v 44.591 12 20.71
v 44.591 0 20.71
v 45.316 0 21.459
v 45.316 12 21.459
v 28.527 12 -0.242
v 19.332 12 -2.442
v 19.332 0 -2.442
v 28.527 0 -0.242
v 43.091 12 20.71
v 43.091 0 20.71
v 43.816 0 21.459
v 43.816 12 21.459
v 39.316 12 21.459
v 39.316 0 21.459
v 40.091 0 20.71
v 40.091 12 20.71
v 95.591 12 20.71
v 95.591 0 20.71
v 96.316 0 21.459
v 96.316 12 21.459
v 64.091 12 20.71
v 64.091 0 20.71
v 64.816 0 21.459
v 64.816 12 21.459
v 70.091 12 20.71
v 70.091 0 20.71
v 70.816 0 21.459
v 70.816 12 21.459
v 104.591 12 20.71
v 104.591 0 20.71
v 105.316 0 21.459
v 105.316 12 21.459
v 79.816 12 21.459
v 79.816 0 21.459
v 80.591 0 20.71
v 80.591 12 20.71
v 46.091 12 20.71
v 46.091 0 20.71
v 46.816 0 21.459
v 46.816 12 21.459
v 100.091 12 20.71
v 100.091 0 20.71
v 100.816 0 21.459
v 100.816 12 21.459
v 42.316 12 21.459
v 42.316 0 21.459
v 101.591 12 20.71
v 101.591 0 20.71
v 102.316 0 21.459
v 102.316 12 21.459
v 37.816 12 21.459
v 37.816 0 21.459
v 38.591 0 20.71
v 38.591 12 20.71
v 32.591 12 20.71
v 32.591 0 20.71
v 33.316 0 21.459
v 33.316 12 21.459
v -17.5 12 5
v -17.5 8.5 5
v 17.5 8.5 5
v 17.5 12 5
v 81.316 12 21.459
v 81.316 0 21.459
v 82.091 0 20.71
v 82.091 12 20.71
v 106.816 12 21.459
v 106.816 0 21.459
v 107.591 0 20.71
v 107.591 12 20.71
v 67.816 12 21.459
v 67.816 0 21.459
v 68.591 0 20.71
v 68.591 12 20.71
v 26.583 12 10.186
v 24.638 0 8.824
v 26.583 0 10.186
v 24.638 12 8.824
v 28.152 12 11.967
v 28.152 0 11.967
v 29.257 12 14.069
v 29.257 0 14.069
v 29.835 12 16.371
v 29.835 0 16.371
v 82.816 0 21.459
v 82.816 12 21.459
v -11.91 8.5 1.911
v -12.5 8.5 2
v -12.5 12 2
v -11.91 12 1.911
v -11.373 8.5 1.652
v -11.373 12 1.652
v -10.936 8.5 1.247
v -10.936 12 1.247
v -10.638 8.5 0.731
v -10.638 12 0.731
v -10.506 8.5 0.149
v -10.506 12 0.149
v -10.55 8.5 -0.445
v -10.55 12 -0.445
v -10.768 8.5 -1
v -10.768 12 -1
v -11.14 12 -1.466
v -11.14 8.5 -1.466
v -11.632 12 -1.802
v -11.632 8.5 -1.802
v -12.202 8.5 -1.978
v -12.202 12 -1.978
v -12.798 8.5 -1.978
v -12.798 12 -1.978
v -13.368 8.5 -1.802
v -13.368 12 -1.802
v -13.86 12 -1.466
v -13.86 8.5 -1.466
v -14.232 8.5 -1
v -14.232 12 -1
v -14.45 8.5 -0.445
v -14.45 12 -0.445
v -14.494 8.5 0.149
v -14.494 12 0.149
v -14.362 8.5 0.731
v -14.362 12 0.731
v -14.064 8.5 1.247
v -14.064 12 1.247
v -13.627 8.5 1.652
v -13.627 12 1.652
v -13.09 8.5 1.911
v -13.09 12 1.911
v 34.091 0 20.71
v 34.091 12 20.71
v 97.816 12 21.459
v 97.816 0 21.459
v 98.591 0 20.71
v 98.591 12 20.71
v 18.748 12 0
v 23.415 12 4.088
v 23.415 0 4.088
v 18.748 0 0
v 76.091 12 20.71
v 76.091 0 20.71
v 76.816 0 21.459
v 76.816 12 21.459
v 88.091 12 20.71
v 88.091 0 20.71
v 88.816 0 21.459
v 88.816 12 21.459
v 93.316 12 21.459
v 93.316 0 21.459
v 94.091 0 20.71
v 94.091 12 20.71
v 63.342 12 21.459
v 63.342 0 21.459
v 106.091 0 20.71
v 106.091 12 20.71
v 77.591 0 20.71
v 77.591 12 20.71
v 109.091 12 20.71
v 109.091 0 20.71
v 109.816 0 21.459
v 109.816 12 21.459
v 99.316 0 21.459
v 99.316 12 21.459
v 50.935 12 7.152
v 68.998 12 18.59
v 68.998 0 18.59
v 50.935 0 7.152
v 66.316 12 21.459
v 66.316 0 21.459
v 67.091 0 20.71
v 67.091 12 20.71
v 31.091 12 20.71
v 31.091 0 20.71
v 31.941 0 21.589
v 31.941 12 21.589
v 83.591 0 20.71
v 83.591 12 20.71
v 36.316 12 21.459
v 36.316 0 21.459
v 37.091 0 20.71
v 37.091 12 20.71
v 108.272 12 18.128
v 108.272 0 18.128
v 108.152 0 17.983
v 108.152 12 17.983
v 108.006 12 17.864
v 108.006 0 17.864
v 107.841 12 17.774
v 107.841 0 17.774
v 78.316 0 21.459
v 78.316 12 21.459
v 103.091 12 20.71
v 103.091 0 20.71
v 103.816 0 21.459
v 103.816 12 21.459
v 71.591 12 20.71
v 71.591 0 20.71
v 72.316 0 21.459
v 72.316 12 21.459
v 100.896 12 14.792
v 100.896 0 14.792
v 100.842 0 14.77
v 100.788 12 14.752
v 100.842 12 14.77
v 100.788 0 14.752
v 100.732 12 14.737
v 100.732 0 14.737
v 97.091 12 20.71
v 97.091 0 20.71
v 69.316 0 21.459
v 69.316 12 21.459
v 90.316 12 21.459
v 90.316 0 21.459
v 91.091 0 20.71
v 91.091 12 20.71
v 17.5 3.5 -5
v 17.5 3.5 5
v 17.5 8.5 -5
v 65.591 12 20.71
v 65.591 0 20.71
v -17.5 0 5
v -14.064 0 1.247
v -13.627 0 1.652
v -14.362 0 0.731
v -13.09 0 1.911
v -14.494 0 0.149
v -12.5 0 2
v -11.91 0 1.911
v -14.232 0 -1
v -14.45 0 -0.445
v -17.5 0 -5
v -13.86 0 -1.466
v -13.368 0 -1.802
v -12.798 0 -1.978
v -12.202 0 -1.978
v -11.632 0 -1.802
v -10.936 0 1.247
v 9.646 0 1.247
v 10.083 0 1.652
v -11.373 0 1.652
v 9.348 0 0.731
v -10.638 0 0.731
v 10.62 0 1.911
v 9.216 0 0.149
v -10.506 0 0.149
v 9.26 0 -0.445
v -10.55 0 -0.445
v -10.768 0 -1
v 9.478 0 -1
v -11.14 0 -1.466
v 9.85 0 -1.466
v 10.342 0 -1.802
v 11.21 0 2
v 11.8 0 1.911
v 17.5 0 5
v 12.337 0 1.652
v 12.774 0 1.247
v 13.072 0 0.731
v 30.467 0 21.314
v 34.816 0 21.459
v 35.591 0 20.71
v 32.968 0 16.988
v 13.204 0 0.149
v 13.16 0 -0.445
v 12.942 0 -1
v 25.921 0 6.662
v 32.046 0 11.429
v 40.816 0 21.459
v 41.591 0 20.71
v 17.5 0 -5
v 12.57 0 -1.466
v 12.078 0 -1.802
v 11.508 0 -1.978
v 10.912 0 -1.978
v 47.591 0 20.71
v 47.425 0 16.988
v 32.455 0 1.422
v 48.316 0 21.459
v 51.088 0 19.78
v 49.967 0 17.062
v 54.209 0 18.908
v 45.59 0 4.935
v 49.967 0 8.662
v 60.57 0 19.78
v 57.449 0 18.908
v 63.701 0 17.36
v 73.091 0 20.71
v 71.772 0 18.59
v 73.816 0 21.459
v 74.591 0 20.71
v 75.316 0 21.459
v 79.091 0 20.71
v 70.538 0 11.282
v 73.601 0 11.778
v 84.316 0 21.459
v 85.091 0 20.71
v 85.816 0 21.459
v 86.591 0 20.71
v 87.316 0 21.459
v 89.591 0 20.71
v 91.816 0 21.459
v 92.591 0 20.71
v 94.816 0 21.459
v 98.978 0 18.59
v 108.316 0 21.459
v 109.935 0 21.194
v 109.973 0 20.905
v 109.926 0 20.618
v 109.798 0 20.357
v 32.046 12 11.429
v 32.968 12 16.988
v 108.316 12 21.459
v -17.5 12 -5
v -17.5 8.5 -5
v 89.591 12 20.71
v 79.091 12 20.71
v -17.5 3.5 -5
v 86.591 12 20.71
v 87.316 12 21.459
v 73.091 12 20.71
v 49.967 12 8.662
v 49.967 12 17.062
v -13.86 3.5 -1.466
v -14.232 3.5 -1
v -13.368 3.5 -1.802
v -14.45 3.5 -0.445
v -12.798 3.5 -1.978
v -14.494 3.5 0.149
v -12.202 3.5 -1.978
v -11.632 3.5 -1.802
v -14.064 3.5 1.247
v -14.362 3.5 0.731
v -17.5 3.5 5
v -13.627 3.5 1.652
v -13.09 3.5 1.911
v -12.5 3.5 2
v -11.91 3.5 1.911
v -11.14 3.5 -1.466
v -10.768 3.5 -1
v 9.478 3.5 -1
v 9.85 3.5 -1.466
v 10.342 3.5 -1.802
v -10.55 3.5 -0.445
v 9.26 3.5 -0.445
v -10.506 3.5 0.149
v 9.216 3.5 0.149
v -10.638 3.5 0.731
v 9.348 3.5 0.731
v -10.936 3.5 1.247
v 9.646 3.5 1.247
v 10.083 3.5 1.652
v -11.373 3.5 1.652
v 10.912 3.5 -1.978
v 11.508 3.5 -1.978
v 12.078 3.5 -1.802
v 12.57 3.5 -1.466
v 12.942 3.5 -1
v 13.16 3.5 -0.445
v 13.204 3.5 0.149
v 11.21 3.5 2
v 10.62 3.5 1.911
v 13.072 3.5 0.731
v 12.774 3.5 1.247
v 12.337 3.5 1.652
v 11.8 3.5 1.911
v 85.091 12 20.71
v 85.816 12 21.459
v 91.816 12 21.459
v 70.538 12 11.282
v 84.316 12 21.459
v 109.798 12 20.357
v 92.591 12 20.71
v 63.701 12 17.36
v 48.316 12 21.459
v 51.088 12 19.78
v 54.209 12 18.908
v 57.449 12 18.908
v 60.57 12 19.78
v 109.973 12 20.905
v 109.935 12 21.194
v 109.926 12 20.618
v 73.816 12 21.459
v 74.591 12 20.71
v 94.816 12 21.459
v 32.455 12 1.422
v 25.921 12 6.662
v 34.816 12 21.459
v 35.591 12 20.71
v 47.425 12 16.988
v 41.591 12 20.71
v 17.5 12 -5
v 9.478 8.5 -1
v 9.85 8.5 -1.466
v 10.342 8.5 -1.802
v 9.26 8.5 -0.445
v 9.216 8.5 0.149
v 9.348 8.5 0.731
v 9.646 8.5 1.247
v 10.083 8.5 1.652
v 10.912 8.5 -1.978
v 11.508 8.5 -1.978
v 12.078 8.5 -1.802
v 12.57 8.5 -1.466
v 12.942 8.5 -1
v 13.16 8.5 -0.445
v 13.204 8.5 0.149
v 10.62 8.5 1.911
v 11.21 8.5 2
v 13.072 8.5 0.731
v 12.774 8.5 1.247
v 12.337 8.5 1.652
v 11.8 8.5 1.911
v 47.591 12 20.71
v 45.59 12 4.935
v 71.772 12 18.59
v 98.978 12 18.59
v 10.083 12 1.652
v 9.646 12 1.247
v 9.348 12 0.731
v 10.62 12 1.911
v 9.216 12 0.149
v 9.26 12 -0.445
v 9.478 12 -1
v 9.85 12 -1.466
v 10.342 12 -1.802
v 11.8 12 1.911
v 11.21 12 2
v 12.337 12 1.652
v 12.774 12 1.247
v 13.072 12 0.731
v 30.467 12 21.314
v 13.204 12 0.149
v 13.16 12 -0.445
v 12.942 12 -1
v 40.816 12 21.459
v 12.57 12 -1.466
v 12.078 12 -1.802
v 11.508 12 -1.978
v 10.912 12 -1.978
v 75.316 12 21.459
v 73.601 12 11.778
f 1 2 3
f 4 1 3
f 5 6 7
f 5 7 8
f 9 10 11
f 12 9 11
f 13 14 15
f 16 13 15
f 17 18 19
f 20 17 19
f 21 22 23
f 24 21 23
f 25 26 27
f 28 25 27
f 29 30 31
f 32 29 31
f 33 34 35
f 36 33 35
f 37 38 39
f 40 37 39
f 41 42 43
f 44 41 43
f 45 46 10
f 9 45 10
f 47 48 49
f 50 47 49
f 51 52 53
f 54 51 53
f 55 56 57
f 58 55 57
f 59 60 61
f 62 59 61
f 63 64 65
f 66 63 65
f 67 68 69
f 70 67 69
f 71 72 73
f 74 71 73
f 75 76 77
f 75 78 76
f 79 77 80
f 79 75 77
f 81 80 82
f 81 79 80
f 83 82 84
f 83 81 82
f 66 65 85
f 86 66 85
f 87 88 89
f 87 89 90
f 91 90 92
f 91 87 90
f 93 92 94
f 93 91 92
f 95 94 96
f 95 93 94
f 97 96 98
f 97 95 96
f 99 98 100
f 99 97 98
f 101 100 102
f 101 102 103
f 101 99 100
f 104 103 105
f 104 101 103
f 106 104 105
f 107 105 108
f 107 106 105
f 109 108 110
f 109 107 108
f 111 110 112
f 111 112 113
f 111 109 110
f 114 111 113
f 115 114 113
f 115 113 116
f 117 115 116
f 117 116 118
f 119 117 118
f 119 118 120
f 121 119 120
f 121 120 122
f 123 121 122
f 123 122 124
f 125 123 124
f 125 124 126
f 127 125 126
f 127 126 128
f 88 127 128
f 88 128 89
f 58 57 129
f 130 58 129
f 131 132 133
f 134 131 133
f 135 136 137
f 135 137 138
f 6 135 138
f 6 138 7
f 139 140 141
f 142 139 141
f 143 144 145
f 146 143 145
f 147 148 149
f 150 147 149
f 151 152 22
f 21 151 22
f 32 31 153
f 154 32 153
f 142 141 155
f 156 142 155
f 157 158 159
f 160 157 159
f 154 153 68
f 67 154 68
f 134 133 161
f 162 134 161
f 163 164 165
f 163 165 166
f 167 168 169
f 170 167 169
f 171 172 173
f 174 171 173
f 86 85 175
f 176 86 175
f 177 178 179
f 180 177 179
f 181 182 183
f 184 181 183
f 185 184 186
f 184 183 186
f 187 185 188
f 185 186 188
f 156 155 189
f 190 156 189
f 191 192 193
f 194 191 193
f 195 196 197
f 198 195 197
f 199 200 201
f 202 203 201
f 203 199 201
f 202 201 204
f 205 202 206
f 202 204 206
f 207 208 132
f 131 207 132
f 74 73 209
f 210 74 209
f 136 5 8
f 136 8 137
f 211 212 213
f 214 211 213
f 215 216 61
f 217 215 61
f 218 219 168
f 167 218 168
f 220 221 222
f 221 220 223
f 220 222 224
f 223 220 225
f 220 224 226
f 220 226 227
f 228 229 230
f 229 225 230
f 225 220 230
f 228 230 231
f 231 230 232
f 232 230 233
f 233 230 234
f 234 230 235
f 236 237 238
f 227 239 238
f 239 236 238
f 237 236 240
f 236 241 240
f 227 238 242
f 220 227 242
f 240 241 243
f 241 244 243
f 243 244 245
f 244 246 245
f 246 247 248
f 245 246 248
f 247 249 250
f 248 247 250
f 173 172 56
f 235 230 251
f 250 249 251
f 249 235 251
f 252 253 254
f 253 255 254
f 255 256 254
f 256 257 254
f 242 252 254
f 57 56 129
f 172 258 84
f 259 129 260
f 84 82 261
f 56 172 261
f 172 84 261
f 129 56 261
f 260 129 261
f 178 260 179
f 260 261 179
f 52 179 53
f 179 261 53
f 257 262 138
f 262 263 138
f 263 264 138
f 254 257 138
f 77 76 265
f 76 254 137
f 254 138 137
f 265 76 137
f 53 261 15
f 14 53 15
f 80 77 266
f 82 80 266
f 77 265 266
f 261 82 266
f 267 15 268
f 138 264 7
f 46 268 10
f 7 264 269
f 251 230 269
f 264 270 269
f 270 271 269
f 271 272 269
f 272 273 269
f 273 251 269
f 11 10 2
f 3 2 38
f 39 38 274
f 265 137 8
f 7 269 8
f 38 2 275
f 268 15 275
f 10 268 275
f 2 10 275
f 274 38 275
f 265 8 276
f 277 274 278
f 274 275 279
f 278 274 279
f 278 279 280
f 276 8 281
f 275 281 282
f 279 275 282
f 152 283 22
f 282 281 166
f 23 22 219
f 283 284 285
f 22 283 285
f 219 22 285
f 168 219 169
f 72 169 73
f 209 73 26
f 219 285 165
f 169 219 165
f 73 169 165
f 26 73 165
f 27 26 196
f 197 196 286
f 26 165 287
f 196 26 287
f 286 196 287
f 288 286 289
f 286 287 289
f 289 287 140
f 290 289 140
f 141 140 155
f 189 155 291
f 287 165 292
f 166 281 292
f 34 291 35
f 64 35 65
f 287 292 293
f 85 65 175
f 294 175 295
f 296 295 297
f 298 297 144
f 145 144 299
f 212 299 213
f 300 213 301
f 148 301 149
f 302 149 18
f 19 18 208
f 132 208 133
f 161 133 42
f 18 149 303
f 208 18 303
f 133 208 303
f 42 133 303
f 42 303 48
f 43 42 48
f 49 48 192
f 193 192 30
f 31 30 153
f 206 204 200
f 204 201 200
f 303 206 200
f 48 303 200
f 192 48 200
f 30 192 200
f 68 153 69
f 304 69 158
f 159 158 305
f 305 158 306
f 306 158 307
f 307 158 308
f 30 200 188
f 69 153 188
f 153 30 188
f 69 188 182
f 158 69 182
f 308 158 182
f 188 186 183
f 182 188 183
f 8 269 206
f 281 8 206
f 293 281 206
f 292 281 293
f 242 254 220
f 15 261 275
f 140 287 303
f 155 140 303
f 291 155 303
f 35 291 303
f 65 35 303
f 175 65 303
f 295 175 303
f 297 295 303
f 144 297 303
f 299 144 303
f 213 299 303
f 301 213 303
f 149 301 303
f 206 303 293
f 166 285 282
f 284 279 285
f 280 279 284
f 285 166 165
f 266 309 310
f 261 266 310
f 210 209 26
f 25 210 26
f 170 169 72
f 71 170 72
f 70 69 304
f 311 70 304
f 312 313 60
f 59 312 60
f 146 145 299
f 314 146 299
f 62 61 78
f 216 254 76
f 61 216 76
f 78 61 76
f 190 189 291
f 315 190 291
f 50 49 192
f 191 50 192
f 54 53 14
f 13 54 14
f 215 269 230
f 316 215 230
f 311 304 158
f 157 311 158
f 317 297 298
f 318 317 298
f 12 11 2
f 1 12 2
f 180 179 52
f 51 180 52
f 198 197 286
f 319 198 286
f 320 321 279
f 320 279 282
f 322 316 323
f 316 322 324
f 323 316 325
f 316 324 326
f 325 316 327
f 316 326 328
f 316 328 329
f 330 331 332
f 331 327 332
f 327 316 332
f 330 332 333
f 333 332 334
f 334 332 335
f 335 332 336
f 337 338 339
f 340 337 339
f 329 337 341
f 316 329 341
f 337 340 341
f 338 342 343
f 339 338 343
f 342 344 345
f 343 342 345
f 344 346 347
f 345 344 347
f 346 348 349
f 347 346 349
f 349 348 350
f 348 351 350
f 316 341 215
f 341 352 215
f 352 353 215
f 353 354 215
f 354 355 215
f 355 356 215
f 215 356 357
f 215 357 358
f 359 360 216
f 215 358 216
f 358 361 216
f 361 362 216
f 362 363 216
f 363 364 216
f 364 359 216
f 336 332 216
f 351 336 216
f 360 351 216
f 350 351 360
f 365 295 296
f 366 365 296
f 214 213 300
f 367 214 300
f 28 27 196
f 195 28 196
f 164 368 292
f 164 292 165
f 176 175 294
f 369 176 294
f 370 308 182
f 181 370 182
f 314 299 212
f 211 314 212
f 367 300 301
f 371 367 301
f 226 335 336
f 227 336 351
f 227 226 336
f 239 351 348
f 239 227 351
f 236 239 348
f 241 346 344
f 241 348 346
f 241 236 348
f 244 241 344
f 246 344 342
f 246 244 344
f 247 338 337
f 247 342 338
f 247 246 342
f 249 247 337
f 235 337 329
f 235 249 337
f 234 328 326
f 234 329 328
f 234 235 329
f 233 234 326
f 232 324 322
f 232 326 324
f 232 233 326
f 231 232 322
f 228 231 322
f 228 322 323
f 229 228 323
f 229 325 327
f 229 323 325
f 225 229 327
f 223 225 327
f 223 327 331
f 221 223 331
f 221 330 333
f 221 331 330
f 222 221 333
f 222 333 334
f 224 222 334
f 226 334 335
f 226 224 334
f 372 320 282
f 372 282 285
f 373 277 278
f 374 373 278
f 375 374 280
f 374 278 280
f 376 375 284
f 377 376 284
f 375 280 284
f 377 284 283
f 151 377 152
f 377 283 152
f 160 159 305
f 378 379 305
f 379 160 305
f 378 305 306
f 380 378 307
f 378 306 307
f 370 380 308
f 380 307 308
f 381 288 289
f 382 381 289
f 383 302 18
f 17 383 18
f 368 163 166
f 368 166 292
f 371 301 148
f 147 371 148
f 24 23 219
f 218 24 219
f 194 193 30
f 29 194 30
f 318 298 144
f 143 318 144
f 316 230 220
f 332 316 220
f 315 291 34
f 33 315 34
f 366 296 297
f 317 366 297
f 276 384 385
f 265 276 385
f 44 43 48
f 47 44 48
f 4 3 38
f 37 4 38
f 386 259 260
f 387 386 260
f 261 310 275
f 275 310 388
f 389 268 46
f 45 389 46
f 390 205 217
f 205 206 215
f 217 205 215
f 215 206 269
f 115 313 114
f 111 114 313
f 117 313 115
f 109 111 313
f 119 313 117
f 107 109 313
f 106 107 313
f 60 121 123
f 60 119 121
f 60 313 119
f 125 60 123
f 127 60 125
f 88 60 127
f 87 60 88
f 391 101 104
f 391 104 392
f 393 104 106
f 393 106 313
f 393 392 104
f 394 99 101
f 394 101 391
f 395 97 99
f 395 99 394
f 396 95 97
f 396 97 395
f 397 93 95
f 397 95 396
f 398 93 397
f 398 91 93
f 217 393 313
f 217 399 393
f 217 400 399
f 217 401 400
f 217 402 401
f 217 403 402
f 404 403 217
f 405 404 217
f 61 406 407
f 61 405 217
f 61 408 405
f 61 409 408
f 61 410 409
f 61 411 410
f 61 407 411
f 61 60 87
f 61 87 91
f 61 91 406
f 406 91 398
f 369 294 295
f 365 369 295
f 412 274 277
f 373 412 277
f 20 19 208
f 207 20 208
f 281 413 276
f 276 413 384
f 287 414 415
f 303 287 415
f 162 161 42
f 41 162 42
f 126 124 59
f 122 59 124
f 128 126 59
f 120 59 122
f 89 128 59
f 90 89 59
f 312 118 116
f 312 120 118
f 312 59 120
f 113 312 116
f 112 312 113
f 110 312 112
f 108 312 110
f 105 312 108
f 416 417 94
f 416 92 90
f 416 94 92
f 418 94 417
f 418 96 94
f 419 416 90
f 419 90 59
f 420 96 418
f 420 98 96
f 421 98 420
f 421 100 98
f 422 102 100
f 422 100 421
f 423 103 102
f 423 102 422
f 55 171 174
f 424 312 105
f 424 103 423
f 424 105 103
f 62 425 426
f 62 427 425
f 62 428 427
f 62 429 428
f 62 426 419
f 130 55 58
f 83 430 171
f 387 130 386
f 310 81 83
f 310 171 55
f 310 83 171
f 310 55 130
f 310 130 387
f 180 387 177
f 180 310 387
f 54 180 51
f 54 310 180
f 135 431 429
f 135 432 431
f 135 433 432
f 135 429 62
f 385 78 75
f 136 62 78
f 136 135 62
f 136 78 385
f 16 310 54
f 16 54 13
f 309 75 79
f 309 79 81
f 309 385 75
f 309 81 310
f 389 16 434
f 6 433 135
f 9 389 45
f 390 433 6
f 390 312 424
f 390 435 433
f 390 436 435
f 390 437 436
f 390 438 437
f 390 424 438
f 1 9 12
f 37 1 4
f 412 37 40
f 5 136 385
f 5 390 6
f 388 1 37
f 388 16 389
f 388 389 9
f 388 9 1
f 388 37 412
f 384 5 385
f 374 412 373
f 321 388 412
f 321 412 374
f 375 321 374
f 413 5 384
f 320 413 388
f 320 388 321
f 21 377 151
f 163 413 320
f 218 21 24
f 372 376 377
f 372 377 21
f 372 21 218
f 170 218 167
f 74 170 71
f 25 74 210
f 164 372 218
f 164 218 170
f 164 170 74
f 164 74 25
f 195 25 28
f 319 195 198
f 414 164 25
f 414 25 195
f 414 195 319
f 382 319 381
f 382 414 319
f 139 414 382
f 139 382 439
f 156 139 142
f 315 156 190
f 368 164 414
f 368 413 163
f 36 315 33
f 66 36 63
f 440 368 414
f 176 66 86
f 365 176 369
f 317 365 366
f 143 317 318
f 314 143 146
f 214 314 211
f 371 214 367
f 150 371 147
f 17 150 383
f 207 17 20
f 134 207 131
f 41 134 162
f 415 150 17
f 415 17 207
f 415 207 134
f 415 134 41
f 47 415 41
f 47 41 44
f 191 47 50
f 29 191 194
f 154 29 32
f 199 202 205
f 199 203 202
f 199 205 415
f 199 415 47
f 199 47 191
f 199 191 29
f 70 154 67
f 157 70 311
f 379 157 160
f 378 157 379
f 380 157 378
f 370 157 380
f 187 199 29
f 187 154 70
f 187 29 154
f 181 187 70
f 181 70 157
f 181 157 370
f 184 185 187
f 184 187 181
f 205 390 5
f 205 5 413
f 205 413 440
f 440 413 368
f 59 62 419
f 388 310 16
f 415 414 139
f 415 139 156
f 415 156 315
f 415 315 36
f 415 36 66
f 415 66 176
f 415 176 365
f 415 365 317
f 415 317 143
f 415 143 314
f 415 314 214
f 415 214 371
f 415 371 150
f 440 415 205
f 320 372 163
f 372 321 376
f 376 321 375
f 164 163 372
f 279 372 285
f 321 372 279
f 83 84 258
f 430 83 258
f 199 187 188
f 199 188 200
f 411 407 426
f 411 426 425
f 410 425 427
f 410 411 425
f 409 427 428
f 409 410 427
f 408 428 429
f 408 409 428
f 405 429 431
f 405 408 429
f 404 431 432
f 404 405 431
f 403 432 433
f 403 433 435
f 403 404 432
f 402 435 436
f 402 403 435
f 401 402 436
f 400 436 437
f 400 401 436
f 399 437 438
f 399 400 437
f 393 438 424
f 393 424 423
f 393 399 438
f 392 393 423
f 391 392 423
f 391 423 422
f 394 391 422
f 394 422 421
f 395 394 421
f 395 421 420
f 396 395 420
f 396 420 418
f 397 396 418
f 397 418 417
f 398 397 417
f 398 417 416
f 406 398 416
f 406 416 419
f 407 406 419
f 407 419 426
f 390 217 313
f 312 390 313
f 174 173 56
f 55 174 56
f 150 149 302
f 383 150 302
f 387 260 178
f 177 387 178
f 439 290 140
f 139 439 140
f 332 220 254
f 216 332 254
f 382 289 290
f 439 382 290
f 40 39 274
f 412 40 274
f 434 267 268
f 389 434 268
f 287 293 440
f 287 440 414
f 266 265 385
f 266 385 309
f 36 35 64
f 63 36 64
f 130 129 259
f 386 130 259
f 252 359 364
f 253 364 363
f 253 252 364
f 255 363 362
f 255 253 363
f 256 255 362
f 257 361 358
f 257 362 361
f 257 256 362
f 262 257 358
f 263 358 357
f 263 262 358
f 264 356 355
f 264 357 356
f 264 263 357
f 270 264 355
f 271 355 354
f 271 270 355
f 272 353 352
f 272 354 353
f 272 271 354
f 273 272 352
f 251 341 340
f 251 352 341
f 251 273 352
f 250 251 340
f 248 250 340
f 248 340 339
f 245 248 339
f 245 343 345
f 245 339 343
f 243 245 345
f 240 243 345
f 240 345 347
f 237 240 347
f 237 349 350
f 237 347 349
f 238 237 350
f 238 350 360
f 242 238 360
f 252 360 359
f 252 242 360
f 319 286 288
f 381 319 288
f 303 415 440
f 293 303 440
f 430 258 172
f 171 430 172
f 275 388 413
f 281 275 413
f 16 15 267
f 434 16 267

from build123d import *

# Parameters (mm, degrees)
SKETCH1_R           = 2
BOSS_EXTRUDE1_DEPTH = 12
SKETCH4_W           = 35
SKETCH4_H           = 5
CUT_EXTRUDE1_DEPTH  = 113.433125829
FILLET2_R           = 10
FILLET3_R           = 1
CUT_EXTRUDE2_DEPTH  = 12


with BuildPart() as part:
    # Sketch1 → Boss-Extrude1 (new body)
    with BuildSketch(Plane(origin=(0, 0, 0), x_dir=(1, 0, 0), z_dir=(0, 1, 0))):
        with BuildLine():
            Line((100.816274371, -14.757411095), (17.5, 5))
            Line((17.5, 5), (-17.5, 5))
            Line((-17.5, 5), (-17.5, -5))
            Line((-17.5, -5), (17.5, -5))
            Line((17.5, -5), (29.181673037, -11.258392105))
            Line((29.181673037, -11.258392105), (30.466555694, -21.314125588))
            Line((30.466555694, -21.314125588), (31.091317661, -20.709888136))
            Line((31.091317661, -20.709888136), (31.94121893, -21.588658537))
            Line((31.94121893, -21.588658537), (32.591317661, -20.709888136))
            Line((32.591317661, -20.709888136), (33.316274371, -21.459469908))
            Line((33.316274371, -21.459469908), (34.091317661, -20.709888136))
            Line((34.091317661, -20.709888136), (34.816274371, -21.459469908))
            Line((34.816274371, -21.459469908), (35.591317661, -20.709888136))
            Line((35.591317661, -20.709888136), (36.316274371, -21.459469908))
            Line((36.316274371, -21.459469908), (37.091317661, -20.709888136))
            Line((37.091317661, -20.709888136), (37.816274371, -21.459469908))
            Line((37.816274371, -21.459469908), (38.591317661, -20.709888136))
            Line((38.591317661, -20.709888136), (39.316274371, -21.459469908))
            Line((39.316274371, -21.459469908), (40.091317661, -20.709888136))
            Line((40.091317661, -20.709888136), (40.816274371, -21.459469908))
            Line((40.816274371, -21.459469908), (41.591317661, -20.709888136))
            Line((41.591317661, -20.709888136), (42.316274371, -21.459469908))
            Line((42.316274371, -21.459469908), (43.091317661, -20.709888136))
            Line((43.091317661, -20.709888136), (43.816274371, -21.459469908))
            Line((43.816274371, -21.459469908), (44.591317661, -20.709888136))
            Line((44.591317661, -20.709888136), (45.316274371, -21.459469908))
            Line((45.316274371, -21.459469908), (46.091317661, -20.709888136))
            Line((46.091317661, -20.709888136), (46.816274371, -21.459469908))
            Line((46.816274371, -21.459469908), (47.591317661, -20.709888136))
            Line((47.591317661, -20.709888136), (48.316274371, -21.459469908))
            ThreePointArc((48.316274371, -21.459469908), (55.82900513, -18.797151194), (63.341735888, -21.459469908))
            Line((63.341735888, -21.459469908), (64.091317661, -20.709888136))
            Line((64.091317661, -20.709888136), (64.816274371, -21.459469908))
            Line((64.816274371, -21.459469908), (65.591317661, -20.709888136))
            Line((65.591317661, -20.709888136), (66.316274371, -21.459469908))
            Line((66.316274371, -21.459469908), (67.091317661, -20.709888136))
            Line((67.091317661, -20.709888136), (67.816274371, -21.459469908))
            Line((67.816274371, -21.459469908), (68.591317661, -20.709888136))
            Line((68.591317661, -20.709888136), (69.316274371, -21.459469908))
            Line((69.316274371, -21.459469908), (70.091317661, -20.709888136))
            Line((70.091317661, -20.709888136), (70.816274371, -21.459469908))
            Line((70.816274371, -21.459469908), (71.591317661, -20.709888136))
            Line((71.591317661, -20.709888136), (72.316274371, -21.459469908))
            Line((72.316274371, -21.459469908), (73.091317661, -20.709888136))
            Line((73.091317661, -20.709888136), (73.816274371, -21.459469908))
            Line((73.816274371, -21.459469908), (74.591317661, -20.709888136))
            Line((74.591317661, -20.709888136), (75.316274371, -21.459469908))
            Line((75.316274371, -21.459469908), (76.091317661, -20.709888136))
            Line((76.091317661, -20.709888136), (76.816274371, -21.459469908))
            Line((76.816274371, -21.459469908), (77.591317661, -20.709888136))
            Line((77.591317661, -20.709888136), (78.316274371, -21.459469908))
            Line((78.316274371, -21.459469908), (79.091317661, -20.709888136))
            Line((79.091317661, -20.709888136), (79.816274371, -21.459469908))
            Line((79.816274371, -21.459469908), (80.591317661, -20.709888136))
            Line((80.591317661, -20.709888136), (81.316274371, -21.459469908))
            Line((81.316274371, -21.459469908), (82.091317661, -20.709888136))
            Line((82.091317661, -20.709888136), (82.816274371, -21.459469908))
            Line((82.816274371, -21.459469908), (83.591317661, -20.709888136))
            Line((83.591317661, -20.709888136), (84.316274371, -21.459469908))
            Line((84.316274371, -21.459469908), (85.091317661, -20.709888136))
            Line((85.091317661, -20.709888136), (85.816274371, -21.459469908))
            Line((85.816274371, -21.459469908), (86.591317661, -20.709888136))
            Line((86.591317661, -20.709888136), (87.316274371, -21.459469908))
            Line((87.316274371, -21.459469908), (88.091317661, -20.709888136))
            Line((88.091317661, -20.709888136), (88.816274371, -21.459469908))
            Line((88.816274371, -21.459469908), (89.591317661, -20.709888136))
            Line((89.591317661, -20.709888136), (90.316274371, -21.459469908))
            Line((90.316274371, -21.459469908), (91.091317661, -20.709888136))
            Line((91.091317661, -20.709888136), (91.816274371, -21.459469908))
            Line((91.816274371, -21.459469908), (92.591317661, -20.709888136))
            Line((92.591317661, -20.709888136), (93.316274371, -21.459469908))
            Line((93.316274371, -21.459469908), (94.091317661, -20.709888136))
            Line((94.091317661, -20.709888136), (94.816274371, -21.459469908))
            Line((94.816274371, -21.459469908), (95.591317661, -20.709888136))
            Line((95.591317661, -20.709888136), (96.316274371, -21.459469908))
            Line((96.316274371, -21.459469908), (97.091317661, -20.709888136))
            Line((97.091317661, -20.709888136), (97.816274371, -21.459469908))
            Line((97.816274371, -21.459469908), (98.591317661, -20.709888136))
            Line((98.591317661, -20.709888136), (99.316274371, -21.459469908))
            Line((99.316274371, -21.459469908), (100.091317661, -20.709888136))
            Line((100.091317661, -20.709888136), (100.816274371, -21.459469908))
            Line((100.816274371, -21.459469908), (101.591317661, -20.709888136))
            Line((101.591317661, -20.709888136), (102.316274371, -21.459469908))
            Line((102.316274371, -21.459469908), (103.091317661, -20.709888136))
            Line((103.091317661, -20.709888136), (103.816274371, -21.459469908))
            Line((103.816274371, -21.459469908), (104.591317661, -20.709888136))
            Line((104.591317661, -20.709888136), (105.316274371, -21.459469908))
            Line((105.316274371, -21.459469908), (106.091317661, -20.709888136))
            Line((106.091317661, -20.709888136), (106.816274371, -21.459469908))
            Line((106.816274371, -21.459469908), (107.591317661, -20.709888136))
            Line((107.591317661, -20.709888136), (108.316274371, -21.459469908))
            Line((108.316274371, -21.459469908), (109.091317661, -20.709888136))
            Line((109.091317661, -20.709888136), (109.816274371, -21.459469908))
            Line((109.816274371, -21.459469908), (110.553264048, -21.459469908))
            Line((110.553264048, -21.459469908), (108.108025111, -17.888455122))
            Line((108.108025111, -17.888455122), (100.816274371, -14.757411095))
        make_face()
        with Locations(Location((11.21, 0, 0), (0, 0, 270))):
            Circle(SKETCH1_R, mode=Mode.SUBTRACT)
        with Locations(Location((-12.5, 0, 0), (0, 0, 270))):
            Circle(SKETCH1_R, mode=Mode.SUBTRACT)
    extrude(amount=BOSS_EXTRUDE1_DEPTH)

    # Sketch4 → Cut-Extrude1 (cut, through all)
    with BuildSketch(Plane.XY.offset(5)):
        with Locations((0, 6)):
            Rectangle(SKETCH4_W, SKETCH4_H)
    extrude(amount=-CUT_EXTRUDE1_DEPTH, mode=Mode.SUBTRACT)

    # Fillet2
    fillet2_edges = [part.edges().sort_by_distance(p)[0] for p in [
        (29.181673037, 6, 11.258392105),
    ]]
    fillet(fillet2_edges, radius=FILLET2_R)

    # Fillet3
    # the kernel refuses this fillet: 1 mm, written as the material it takes off along each edge
    with BuildSketch(Plane(origin=(100.816274371, -0.216477457, 14.757411095), x_dir=(-0.9730157961539994, 0, -0.23073851094864703), z_dir=(0, 1, 0))) as fillet3_piece_1:
        with BuildLine():
            CenterArc((FILLET3_R * 0.0865909827585, FILLET3_R), FILLET3_R, 260.102093181, 9.897906819)
            Line((-FILLET3_R * 0.0853021285033, FILLET3_R * 0.0148843934336), (-FILLET3_R * 0.0887399907286, -FILLET3_R * 0.00481791869774))
            Line((-FILLET3_R * 0.0887399907286, -FILLET3_R * 0.00481791869774), (-FILLET3_R * 0.00173181965517, -FILLET3_R * 0.02))
            Line((-FILLET3_R * 0.00173181965517, -FILLET3_R * 0.02), (FILLET3_R * 0.0865909827585, -FILLET3_R * 0.02))
            Line((FILLET3_R * 0.0865909827585, -FILLET3_R * 0.02), (FILLET3_R * 0.0865909827585, 0))
        make_face()
    extrude(amount=12.432954914, mode=Mode.SUBTRACT)
    with BuildSketch(Plane(origin=(108.108025111, -0.725377826, 17.888455122), x_dir=(-0.9188706856920634, 0, -0.3945588206792459), z_dir=(0, 1, 0))) as fillet3_piece_2:
        with BuildLine():
            CenterArc((FILLET3_R * 0.29015113035, FILLET3_R), FILLET3_R, 237.639707831, 32.360292169)
            Line((-FILLET3_R * 0.245090389396, FILLET3_R * 0.155300931965), (-FILLET3_R * 0.255795219791, FILLET3_R * 0.138406950604))
            Line((-FILLET3_R * 0.255795219791, FILLET3_R * 0.138406950604), (-FILLET3_R * 0.005803022607, -FILLET3_R * 0.02))
            Line((-FILLET3_R * 0.005803022607, -FILLET3_R * 0.02), (FILLET3_R * 0.29015113035, -FILLET3_R * 0.02))
            Line((FILLET3_R * 0.29015113035, -FILLET3_R * 0.02), (FILLET3_R * 0.29015113035, 0))
        make_face()
    extrude(amount=13.450755652, mode=Mode.SUBTRACT)
    with BuildSketch(Plane(origin=(110.553264048, -3.340980233, 21.459469908), x_dir=(-0.56498494903948, 0, -0.8251012103729192), z_dir=(0, 1, 0))) as fillet3_piece_3:
        with BuildLine():
            CenterArc((1.336392093, 1), FILLET3_R, 203.073330595, 66.926669405)
            Line((0.416388075, 0.608091074), (0.397987995, 0.600252896))
            ThreePointArc((0.397987995, 0.600252896), (0.191692013, 0.315345236), (-0.016502024, 0.011299699))
            Line((-0.016502024, 0.011299699), (0, -0.02))
            Line((0, -0.02), (1.336392093, -0.02))
            Line((1.336392093, -0.02), (1.336392093, 0))
        make_face()
    extrude(amount=18.681960466, mode=Mode.SUBTRACT)

    # Sketch5 → Cut-Extrude2 (cut)
    with BuildSketch(Plane(origin=(0, 12, 0), x_dir=(1, 0, 0), z_dir=(0, 1, 0))):
        Polygon((19.332052257, 2.4424245), (28.526818603, 0.242248117), (23.41536762, -4.087850301), (18.747614926, 0), align=None)
        Polygon((25.921082251, -6.661828657), (32.046043612, -11.428585655), (32.967525074, -16.9883699), (47.424517669, -16.9883699), (45.590433757, -4.934746753), (32.454936428, -1.421521761), align=None)
        Polygon((50.93529797, -7.151679552), (70.537795207, -11.282164386), (68.99785337, -18.590436131), align=None)
        Polygon((49.967342783, -8.662131451), (63.701149707, -17.359553871), (49.967342783, -17.061744713), align=None)
        Polygon((71.772087814, -18.590436131), (98.977842755, -18.590436131), (73.60079207, -11.778158935), align=None)
    extrude(amount=-CUT_EXTRUDE2_DEPTH, mode=Mode.SUBTRACT)


solid = part.part
